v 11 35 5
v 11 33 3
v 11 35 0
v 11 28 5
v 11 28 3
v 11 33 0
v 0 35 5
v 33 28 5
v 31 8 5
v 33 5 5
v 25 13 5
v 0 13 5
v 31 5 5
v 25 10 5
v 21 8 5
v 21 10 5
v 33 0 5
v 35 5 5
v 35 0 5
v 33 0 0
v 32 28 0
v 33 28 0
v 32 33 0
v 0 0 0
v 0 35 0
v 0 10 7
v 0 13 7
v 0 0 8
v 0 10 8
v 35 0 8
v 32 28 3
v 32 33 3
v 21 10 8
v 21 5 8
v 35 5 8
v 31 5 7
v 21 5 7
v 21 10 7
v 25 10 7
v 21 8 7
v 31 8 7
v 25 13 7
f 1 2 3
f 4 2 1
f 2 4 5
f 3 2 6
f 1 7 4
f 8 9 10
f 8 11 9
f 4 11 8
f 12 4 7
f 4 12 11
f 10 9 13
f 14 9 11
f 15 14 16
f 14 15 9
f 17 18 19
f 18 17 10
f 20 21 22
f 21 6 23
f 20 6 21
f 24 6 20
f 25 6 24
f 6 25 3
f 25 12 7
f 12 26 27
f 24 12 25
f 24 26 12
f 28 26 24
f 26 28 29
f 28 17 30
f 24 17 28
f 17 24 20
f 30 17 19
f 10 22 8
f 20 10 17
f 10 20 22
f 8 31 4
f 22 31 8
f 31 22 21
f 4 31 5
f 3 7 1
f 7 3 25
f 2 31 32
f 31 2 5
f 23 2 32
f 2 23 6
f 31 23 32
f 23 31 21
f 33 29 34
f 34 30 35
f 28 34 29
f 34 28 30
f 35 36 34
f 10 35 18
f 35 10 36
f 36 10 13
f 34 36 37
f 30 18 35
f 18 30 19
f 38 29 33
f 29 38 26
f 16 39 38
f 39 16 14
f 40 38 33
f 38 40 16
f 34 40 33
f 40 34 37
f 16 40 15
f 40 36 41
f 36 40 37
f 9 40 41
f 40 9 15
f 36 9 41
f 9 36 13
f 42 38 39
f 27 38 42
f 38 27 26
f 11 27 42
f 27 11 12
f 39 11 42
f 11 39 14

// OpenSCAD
translate([5.5, 3.5, 2.5]) color([0.35920119725374633, 0.9469058356578911, 0.6337478522492526]) cube([11, 7, 5], center=true);
translate([16.5, 3.5, 2.5]) color([0.6210768456186673, 0.7156193503014563, 0.38801723531250565]) cube([11, 7, 5], center=true);
translate([27.5, 3.5, 2.5]) color([0.4144179882772473, 0.650832862263345, 0.001524221856720187]) cube([11, 7, 5], center=true);
translate([5.5, 10.5, 2.5]) color([0.1923095412446758, 0.3344016906625016, 0.23941596018595857]) cube([11, 7, 5], center=true);
translate([16.5, 10.5, 2.5]) color([0.6373994011293003, 0.37864807032309444, 0.8754233917130172]) cube([11, 7, 5], center=true);
translate([27.5, 10.5, 2.5]) color([0.5681514209101919, 0.4144063966836443, 0.40226707511907955]) cube([11, 7, 5], center=true);
translate([5.5, 17.5, 2.5]) color([0.7018296239336754, 0.41822655329246605, 0.6621958889738174]) cube([11, 7, 5], center=true);
translate([16.5, 17.5, 2.5]) color([0.04677968595679827, 0.44535218971882984, 0.25922692344722276]) cube([11, 7, 5], center=true);
translate([27.5, 17.5, 2.5]) color([0.15768657212231085, 0.5275731301676146, 0.48726560106903205]) cube([11, 7, 5], center=true);
translate([5.5, 24.5, 2.5]) color([0.5614049256144269, 0.7554847672586825, 0.8838751542487009]) cube([11, 7, 5], center=true);
translate([16.5, 24.5, 2.5]) color([0.4945826703752868, 0.31205824641687296, 0.46689223535252355]) cube([11, 7, 5], center=true);
translate([27.5, 24.5, 2.5]) color([0.8090458573603624, 0.8750163314802711, 0.8124149323637591]) cube([11, 7, 5], center=true);
translate([5.5, 31.5, 2.5]) color([0.188001294050828, 0.9994203594553304, 0.6330887599183004]) cube([11, 7, 5], center=true);
translate([14.5, 30.5, 1.5]) color([0.08346705017572931, 0.7255543554613124, 0.9868214802051282]) cube([7, 5, 3], center=true);
translate([21.5, 30.5, 1.5]) color([0.40181682221254356, 0.6785150052419683, 0.31617713722134233]) cube([7, 5, 3], center=true);
translate([28.5, 30.5, 1.5]) color([0.2135246620646961, 0.7173241433110372, 0.0023575647193538884]) cube([7, 5, 3], center=true);
translate([3.5, 2.5, 6.5]) color([0.8227314105314157, 0.5283459768597928, 0.09778434180065931]) cube([7, 5, 3], center=true);
translate([10.5, 2.5, 6.5]) color([0.11890389478474583, 0.6492654248961536, 0.8736538239003423]) cube([7, 5, 3], center=true);
translate([17.5, 2.5, 6.5]) color([0.27998274332687256, 0.9785151867733981, 0.10018068906370903]) cube([7, 5, 3], center=true);
translate([24.5, 2.5, 6.5]) color([0.8539381095973382, 0.39669617733090445, 0.08134541676823415]) cube([7, 5, 3], center=true);
translate([31.5, 2.5, 6.5]) color([0.2747138434192621, 0.4529781848179143, 0.7923415311856522]) cube([7, 5, 3], center=true);
translate([3.5, 7.5, 6.5]) color([0.8613599036372361, 0.13342055420254906, 0.5208655284141989]) cube([7, 5, 3], center=true);
translate([10.5, 7.5, 6.5]) color([0.6507832381497373, 0.3470530145996015, 0.8718638357105861]) cube([7, 5, 3], center=true);
translate([17.5, 7.5, 6.5]) color([0.27840981521636055, 0.01857432754559518, 0.0406632736752609]) cube([7, 5, 3], center=true);
translate([23.5, 6.5, 6.0]) color([0.6809967701112433, 0.5583557360970469, 0.946502554169996]) cube([5, 3, 2], center=true);
translate([28.5, 6.5, 6.0]) color([0.9384387997349186, 0.9098511774051025, 0.04200453196734122]) cube([5, 3, 2], center=true);
translate([2.5, 11.5, 6.0]) color([0.7491348233908631, 0.7013248175948597, 0.6553618646747296]) cube([5, 3, 2], center=true);
translate([7.5, 11.5, 6.0]) color([0.7123576525162417, 0.9027101506193307, 0.6401411997932241]) cube([5, 3, 2], center=true);
translate([12.5, 11.5, 6.0]) color([0.372449262972256, 0.5379287837318205, 0.20784410369082473]) cube([5, 3, 2], center=true);
translate([17.5, 11.5, 6.0]) color([0.5871255046951435, 0.008897082049078797, 0.15102317386398778]) cube([5, 3, 2], center=true);
translate([22.5, 11.5, 6.0]) color([0.3334083880298664, 0.7896231589257826, 0.7184994227715396]) cube([5, 3, 2], center=true);
